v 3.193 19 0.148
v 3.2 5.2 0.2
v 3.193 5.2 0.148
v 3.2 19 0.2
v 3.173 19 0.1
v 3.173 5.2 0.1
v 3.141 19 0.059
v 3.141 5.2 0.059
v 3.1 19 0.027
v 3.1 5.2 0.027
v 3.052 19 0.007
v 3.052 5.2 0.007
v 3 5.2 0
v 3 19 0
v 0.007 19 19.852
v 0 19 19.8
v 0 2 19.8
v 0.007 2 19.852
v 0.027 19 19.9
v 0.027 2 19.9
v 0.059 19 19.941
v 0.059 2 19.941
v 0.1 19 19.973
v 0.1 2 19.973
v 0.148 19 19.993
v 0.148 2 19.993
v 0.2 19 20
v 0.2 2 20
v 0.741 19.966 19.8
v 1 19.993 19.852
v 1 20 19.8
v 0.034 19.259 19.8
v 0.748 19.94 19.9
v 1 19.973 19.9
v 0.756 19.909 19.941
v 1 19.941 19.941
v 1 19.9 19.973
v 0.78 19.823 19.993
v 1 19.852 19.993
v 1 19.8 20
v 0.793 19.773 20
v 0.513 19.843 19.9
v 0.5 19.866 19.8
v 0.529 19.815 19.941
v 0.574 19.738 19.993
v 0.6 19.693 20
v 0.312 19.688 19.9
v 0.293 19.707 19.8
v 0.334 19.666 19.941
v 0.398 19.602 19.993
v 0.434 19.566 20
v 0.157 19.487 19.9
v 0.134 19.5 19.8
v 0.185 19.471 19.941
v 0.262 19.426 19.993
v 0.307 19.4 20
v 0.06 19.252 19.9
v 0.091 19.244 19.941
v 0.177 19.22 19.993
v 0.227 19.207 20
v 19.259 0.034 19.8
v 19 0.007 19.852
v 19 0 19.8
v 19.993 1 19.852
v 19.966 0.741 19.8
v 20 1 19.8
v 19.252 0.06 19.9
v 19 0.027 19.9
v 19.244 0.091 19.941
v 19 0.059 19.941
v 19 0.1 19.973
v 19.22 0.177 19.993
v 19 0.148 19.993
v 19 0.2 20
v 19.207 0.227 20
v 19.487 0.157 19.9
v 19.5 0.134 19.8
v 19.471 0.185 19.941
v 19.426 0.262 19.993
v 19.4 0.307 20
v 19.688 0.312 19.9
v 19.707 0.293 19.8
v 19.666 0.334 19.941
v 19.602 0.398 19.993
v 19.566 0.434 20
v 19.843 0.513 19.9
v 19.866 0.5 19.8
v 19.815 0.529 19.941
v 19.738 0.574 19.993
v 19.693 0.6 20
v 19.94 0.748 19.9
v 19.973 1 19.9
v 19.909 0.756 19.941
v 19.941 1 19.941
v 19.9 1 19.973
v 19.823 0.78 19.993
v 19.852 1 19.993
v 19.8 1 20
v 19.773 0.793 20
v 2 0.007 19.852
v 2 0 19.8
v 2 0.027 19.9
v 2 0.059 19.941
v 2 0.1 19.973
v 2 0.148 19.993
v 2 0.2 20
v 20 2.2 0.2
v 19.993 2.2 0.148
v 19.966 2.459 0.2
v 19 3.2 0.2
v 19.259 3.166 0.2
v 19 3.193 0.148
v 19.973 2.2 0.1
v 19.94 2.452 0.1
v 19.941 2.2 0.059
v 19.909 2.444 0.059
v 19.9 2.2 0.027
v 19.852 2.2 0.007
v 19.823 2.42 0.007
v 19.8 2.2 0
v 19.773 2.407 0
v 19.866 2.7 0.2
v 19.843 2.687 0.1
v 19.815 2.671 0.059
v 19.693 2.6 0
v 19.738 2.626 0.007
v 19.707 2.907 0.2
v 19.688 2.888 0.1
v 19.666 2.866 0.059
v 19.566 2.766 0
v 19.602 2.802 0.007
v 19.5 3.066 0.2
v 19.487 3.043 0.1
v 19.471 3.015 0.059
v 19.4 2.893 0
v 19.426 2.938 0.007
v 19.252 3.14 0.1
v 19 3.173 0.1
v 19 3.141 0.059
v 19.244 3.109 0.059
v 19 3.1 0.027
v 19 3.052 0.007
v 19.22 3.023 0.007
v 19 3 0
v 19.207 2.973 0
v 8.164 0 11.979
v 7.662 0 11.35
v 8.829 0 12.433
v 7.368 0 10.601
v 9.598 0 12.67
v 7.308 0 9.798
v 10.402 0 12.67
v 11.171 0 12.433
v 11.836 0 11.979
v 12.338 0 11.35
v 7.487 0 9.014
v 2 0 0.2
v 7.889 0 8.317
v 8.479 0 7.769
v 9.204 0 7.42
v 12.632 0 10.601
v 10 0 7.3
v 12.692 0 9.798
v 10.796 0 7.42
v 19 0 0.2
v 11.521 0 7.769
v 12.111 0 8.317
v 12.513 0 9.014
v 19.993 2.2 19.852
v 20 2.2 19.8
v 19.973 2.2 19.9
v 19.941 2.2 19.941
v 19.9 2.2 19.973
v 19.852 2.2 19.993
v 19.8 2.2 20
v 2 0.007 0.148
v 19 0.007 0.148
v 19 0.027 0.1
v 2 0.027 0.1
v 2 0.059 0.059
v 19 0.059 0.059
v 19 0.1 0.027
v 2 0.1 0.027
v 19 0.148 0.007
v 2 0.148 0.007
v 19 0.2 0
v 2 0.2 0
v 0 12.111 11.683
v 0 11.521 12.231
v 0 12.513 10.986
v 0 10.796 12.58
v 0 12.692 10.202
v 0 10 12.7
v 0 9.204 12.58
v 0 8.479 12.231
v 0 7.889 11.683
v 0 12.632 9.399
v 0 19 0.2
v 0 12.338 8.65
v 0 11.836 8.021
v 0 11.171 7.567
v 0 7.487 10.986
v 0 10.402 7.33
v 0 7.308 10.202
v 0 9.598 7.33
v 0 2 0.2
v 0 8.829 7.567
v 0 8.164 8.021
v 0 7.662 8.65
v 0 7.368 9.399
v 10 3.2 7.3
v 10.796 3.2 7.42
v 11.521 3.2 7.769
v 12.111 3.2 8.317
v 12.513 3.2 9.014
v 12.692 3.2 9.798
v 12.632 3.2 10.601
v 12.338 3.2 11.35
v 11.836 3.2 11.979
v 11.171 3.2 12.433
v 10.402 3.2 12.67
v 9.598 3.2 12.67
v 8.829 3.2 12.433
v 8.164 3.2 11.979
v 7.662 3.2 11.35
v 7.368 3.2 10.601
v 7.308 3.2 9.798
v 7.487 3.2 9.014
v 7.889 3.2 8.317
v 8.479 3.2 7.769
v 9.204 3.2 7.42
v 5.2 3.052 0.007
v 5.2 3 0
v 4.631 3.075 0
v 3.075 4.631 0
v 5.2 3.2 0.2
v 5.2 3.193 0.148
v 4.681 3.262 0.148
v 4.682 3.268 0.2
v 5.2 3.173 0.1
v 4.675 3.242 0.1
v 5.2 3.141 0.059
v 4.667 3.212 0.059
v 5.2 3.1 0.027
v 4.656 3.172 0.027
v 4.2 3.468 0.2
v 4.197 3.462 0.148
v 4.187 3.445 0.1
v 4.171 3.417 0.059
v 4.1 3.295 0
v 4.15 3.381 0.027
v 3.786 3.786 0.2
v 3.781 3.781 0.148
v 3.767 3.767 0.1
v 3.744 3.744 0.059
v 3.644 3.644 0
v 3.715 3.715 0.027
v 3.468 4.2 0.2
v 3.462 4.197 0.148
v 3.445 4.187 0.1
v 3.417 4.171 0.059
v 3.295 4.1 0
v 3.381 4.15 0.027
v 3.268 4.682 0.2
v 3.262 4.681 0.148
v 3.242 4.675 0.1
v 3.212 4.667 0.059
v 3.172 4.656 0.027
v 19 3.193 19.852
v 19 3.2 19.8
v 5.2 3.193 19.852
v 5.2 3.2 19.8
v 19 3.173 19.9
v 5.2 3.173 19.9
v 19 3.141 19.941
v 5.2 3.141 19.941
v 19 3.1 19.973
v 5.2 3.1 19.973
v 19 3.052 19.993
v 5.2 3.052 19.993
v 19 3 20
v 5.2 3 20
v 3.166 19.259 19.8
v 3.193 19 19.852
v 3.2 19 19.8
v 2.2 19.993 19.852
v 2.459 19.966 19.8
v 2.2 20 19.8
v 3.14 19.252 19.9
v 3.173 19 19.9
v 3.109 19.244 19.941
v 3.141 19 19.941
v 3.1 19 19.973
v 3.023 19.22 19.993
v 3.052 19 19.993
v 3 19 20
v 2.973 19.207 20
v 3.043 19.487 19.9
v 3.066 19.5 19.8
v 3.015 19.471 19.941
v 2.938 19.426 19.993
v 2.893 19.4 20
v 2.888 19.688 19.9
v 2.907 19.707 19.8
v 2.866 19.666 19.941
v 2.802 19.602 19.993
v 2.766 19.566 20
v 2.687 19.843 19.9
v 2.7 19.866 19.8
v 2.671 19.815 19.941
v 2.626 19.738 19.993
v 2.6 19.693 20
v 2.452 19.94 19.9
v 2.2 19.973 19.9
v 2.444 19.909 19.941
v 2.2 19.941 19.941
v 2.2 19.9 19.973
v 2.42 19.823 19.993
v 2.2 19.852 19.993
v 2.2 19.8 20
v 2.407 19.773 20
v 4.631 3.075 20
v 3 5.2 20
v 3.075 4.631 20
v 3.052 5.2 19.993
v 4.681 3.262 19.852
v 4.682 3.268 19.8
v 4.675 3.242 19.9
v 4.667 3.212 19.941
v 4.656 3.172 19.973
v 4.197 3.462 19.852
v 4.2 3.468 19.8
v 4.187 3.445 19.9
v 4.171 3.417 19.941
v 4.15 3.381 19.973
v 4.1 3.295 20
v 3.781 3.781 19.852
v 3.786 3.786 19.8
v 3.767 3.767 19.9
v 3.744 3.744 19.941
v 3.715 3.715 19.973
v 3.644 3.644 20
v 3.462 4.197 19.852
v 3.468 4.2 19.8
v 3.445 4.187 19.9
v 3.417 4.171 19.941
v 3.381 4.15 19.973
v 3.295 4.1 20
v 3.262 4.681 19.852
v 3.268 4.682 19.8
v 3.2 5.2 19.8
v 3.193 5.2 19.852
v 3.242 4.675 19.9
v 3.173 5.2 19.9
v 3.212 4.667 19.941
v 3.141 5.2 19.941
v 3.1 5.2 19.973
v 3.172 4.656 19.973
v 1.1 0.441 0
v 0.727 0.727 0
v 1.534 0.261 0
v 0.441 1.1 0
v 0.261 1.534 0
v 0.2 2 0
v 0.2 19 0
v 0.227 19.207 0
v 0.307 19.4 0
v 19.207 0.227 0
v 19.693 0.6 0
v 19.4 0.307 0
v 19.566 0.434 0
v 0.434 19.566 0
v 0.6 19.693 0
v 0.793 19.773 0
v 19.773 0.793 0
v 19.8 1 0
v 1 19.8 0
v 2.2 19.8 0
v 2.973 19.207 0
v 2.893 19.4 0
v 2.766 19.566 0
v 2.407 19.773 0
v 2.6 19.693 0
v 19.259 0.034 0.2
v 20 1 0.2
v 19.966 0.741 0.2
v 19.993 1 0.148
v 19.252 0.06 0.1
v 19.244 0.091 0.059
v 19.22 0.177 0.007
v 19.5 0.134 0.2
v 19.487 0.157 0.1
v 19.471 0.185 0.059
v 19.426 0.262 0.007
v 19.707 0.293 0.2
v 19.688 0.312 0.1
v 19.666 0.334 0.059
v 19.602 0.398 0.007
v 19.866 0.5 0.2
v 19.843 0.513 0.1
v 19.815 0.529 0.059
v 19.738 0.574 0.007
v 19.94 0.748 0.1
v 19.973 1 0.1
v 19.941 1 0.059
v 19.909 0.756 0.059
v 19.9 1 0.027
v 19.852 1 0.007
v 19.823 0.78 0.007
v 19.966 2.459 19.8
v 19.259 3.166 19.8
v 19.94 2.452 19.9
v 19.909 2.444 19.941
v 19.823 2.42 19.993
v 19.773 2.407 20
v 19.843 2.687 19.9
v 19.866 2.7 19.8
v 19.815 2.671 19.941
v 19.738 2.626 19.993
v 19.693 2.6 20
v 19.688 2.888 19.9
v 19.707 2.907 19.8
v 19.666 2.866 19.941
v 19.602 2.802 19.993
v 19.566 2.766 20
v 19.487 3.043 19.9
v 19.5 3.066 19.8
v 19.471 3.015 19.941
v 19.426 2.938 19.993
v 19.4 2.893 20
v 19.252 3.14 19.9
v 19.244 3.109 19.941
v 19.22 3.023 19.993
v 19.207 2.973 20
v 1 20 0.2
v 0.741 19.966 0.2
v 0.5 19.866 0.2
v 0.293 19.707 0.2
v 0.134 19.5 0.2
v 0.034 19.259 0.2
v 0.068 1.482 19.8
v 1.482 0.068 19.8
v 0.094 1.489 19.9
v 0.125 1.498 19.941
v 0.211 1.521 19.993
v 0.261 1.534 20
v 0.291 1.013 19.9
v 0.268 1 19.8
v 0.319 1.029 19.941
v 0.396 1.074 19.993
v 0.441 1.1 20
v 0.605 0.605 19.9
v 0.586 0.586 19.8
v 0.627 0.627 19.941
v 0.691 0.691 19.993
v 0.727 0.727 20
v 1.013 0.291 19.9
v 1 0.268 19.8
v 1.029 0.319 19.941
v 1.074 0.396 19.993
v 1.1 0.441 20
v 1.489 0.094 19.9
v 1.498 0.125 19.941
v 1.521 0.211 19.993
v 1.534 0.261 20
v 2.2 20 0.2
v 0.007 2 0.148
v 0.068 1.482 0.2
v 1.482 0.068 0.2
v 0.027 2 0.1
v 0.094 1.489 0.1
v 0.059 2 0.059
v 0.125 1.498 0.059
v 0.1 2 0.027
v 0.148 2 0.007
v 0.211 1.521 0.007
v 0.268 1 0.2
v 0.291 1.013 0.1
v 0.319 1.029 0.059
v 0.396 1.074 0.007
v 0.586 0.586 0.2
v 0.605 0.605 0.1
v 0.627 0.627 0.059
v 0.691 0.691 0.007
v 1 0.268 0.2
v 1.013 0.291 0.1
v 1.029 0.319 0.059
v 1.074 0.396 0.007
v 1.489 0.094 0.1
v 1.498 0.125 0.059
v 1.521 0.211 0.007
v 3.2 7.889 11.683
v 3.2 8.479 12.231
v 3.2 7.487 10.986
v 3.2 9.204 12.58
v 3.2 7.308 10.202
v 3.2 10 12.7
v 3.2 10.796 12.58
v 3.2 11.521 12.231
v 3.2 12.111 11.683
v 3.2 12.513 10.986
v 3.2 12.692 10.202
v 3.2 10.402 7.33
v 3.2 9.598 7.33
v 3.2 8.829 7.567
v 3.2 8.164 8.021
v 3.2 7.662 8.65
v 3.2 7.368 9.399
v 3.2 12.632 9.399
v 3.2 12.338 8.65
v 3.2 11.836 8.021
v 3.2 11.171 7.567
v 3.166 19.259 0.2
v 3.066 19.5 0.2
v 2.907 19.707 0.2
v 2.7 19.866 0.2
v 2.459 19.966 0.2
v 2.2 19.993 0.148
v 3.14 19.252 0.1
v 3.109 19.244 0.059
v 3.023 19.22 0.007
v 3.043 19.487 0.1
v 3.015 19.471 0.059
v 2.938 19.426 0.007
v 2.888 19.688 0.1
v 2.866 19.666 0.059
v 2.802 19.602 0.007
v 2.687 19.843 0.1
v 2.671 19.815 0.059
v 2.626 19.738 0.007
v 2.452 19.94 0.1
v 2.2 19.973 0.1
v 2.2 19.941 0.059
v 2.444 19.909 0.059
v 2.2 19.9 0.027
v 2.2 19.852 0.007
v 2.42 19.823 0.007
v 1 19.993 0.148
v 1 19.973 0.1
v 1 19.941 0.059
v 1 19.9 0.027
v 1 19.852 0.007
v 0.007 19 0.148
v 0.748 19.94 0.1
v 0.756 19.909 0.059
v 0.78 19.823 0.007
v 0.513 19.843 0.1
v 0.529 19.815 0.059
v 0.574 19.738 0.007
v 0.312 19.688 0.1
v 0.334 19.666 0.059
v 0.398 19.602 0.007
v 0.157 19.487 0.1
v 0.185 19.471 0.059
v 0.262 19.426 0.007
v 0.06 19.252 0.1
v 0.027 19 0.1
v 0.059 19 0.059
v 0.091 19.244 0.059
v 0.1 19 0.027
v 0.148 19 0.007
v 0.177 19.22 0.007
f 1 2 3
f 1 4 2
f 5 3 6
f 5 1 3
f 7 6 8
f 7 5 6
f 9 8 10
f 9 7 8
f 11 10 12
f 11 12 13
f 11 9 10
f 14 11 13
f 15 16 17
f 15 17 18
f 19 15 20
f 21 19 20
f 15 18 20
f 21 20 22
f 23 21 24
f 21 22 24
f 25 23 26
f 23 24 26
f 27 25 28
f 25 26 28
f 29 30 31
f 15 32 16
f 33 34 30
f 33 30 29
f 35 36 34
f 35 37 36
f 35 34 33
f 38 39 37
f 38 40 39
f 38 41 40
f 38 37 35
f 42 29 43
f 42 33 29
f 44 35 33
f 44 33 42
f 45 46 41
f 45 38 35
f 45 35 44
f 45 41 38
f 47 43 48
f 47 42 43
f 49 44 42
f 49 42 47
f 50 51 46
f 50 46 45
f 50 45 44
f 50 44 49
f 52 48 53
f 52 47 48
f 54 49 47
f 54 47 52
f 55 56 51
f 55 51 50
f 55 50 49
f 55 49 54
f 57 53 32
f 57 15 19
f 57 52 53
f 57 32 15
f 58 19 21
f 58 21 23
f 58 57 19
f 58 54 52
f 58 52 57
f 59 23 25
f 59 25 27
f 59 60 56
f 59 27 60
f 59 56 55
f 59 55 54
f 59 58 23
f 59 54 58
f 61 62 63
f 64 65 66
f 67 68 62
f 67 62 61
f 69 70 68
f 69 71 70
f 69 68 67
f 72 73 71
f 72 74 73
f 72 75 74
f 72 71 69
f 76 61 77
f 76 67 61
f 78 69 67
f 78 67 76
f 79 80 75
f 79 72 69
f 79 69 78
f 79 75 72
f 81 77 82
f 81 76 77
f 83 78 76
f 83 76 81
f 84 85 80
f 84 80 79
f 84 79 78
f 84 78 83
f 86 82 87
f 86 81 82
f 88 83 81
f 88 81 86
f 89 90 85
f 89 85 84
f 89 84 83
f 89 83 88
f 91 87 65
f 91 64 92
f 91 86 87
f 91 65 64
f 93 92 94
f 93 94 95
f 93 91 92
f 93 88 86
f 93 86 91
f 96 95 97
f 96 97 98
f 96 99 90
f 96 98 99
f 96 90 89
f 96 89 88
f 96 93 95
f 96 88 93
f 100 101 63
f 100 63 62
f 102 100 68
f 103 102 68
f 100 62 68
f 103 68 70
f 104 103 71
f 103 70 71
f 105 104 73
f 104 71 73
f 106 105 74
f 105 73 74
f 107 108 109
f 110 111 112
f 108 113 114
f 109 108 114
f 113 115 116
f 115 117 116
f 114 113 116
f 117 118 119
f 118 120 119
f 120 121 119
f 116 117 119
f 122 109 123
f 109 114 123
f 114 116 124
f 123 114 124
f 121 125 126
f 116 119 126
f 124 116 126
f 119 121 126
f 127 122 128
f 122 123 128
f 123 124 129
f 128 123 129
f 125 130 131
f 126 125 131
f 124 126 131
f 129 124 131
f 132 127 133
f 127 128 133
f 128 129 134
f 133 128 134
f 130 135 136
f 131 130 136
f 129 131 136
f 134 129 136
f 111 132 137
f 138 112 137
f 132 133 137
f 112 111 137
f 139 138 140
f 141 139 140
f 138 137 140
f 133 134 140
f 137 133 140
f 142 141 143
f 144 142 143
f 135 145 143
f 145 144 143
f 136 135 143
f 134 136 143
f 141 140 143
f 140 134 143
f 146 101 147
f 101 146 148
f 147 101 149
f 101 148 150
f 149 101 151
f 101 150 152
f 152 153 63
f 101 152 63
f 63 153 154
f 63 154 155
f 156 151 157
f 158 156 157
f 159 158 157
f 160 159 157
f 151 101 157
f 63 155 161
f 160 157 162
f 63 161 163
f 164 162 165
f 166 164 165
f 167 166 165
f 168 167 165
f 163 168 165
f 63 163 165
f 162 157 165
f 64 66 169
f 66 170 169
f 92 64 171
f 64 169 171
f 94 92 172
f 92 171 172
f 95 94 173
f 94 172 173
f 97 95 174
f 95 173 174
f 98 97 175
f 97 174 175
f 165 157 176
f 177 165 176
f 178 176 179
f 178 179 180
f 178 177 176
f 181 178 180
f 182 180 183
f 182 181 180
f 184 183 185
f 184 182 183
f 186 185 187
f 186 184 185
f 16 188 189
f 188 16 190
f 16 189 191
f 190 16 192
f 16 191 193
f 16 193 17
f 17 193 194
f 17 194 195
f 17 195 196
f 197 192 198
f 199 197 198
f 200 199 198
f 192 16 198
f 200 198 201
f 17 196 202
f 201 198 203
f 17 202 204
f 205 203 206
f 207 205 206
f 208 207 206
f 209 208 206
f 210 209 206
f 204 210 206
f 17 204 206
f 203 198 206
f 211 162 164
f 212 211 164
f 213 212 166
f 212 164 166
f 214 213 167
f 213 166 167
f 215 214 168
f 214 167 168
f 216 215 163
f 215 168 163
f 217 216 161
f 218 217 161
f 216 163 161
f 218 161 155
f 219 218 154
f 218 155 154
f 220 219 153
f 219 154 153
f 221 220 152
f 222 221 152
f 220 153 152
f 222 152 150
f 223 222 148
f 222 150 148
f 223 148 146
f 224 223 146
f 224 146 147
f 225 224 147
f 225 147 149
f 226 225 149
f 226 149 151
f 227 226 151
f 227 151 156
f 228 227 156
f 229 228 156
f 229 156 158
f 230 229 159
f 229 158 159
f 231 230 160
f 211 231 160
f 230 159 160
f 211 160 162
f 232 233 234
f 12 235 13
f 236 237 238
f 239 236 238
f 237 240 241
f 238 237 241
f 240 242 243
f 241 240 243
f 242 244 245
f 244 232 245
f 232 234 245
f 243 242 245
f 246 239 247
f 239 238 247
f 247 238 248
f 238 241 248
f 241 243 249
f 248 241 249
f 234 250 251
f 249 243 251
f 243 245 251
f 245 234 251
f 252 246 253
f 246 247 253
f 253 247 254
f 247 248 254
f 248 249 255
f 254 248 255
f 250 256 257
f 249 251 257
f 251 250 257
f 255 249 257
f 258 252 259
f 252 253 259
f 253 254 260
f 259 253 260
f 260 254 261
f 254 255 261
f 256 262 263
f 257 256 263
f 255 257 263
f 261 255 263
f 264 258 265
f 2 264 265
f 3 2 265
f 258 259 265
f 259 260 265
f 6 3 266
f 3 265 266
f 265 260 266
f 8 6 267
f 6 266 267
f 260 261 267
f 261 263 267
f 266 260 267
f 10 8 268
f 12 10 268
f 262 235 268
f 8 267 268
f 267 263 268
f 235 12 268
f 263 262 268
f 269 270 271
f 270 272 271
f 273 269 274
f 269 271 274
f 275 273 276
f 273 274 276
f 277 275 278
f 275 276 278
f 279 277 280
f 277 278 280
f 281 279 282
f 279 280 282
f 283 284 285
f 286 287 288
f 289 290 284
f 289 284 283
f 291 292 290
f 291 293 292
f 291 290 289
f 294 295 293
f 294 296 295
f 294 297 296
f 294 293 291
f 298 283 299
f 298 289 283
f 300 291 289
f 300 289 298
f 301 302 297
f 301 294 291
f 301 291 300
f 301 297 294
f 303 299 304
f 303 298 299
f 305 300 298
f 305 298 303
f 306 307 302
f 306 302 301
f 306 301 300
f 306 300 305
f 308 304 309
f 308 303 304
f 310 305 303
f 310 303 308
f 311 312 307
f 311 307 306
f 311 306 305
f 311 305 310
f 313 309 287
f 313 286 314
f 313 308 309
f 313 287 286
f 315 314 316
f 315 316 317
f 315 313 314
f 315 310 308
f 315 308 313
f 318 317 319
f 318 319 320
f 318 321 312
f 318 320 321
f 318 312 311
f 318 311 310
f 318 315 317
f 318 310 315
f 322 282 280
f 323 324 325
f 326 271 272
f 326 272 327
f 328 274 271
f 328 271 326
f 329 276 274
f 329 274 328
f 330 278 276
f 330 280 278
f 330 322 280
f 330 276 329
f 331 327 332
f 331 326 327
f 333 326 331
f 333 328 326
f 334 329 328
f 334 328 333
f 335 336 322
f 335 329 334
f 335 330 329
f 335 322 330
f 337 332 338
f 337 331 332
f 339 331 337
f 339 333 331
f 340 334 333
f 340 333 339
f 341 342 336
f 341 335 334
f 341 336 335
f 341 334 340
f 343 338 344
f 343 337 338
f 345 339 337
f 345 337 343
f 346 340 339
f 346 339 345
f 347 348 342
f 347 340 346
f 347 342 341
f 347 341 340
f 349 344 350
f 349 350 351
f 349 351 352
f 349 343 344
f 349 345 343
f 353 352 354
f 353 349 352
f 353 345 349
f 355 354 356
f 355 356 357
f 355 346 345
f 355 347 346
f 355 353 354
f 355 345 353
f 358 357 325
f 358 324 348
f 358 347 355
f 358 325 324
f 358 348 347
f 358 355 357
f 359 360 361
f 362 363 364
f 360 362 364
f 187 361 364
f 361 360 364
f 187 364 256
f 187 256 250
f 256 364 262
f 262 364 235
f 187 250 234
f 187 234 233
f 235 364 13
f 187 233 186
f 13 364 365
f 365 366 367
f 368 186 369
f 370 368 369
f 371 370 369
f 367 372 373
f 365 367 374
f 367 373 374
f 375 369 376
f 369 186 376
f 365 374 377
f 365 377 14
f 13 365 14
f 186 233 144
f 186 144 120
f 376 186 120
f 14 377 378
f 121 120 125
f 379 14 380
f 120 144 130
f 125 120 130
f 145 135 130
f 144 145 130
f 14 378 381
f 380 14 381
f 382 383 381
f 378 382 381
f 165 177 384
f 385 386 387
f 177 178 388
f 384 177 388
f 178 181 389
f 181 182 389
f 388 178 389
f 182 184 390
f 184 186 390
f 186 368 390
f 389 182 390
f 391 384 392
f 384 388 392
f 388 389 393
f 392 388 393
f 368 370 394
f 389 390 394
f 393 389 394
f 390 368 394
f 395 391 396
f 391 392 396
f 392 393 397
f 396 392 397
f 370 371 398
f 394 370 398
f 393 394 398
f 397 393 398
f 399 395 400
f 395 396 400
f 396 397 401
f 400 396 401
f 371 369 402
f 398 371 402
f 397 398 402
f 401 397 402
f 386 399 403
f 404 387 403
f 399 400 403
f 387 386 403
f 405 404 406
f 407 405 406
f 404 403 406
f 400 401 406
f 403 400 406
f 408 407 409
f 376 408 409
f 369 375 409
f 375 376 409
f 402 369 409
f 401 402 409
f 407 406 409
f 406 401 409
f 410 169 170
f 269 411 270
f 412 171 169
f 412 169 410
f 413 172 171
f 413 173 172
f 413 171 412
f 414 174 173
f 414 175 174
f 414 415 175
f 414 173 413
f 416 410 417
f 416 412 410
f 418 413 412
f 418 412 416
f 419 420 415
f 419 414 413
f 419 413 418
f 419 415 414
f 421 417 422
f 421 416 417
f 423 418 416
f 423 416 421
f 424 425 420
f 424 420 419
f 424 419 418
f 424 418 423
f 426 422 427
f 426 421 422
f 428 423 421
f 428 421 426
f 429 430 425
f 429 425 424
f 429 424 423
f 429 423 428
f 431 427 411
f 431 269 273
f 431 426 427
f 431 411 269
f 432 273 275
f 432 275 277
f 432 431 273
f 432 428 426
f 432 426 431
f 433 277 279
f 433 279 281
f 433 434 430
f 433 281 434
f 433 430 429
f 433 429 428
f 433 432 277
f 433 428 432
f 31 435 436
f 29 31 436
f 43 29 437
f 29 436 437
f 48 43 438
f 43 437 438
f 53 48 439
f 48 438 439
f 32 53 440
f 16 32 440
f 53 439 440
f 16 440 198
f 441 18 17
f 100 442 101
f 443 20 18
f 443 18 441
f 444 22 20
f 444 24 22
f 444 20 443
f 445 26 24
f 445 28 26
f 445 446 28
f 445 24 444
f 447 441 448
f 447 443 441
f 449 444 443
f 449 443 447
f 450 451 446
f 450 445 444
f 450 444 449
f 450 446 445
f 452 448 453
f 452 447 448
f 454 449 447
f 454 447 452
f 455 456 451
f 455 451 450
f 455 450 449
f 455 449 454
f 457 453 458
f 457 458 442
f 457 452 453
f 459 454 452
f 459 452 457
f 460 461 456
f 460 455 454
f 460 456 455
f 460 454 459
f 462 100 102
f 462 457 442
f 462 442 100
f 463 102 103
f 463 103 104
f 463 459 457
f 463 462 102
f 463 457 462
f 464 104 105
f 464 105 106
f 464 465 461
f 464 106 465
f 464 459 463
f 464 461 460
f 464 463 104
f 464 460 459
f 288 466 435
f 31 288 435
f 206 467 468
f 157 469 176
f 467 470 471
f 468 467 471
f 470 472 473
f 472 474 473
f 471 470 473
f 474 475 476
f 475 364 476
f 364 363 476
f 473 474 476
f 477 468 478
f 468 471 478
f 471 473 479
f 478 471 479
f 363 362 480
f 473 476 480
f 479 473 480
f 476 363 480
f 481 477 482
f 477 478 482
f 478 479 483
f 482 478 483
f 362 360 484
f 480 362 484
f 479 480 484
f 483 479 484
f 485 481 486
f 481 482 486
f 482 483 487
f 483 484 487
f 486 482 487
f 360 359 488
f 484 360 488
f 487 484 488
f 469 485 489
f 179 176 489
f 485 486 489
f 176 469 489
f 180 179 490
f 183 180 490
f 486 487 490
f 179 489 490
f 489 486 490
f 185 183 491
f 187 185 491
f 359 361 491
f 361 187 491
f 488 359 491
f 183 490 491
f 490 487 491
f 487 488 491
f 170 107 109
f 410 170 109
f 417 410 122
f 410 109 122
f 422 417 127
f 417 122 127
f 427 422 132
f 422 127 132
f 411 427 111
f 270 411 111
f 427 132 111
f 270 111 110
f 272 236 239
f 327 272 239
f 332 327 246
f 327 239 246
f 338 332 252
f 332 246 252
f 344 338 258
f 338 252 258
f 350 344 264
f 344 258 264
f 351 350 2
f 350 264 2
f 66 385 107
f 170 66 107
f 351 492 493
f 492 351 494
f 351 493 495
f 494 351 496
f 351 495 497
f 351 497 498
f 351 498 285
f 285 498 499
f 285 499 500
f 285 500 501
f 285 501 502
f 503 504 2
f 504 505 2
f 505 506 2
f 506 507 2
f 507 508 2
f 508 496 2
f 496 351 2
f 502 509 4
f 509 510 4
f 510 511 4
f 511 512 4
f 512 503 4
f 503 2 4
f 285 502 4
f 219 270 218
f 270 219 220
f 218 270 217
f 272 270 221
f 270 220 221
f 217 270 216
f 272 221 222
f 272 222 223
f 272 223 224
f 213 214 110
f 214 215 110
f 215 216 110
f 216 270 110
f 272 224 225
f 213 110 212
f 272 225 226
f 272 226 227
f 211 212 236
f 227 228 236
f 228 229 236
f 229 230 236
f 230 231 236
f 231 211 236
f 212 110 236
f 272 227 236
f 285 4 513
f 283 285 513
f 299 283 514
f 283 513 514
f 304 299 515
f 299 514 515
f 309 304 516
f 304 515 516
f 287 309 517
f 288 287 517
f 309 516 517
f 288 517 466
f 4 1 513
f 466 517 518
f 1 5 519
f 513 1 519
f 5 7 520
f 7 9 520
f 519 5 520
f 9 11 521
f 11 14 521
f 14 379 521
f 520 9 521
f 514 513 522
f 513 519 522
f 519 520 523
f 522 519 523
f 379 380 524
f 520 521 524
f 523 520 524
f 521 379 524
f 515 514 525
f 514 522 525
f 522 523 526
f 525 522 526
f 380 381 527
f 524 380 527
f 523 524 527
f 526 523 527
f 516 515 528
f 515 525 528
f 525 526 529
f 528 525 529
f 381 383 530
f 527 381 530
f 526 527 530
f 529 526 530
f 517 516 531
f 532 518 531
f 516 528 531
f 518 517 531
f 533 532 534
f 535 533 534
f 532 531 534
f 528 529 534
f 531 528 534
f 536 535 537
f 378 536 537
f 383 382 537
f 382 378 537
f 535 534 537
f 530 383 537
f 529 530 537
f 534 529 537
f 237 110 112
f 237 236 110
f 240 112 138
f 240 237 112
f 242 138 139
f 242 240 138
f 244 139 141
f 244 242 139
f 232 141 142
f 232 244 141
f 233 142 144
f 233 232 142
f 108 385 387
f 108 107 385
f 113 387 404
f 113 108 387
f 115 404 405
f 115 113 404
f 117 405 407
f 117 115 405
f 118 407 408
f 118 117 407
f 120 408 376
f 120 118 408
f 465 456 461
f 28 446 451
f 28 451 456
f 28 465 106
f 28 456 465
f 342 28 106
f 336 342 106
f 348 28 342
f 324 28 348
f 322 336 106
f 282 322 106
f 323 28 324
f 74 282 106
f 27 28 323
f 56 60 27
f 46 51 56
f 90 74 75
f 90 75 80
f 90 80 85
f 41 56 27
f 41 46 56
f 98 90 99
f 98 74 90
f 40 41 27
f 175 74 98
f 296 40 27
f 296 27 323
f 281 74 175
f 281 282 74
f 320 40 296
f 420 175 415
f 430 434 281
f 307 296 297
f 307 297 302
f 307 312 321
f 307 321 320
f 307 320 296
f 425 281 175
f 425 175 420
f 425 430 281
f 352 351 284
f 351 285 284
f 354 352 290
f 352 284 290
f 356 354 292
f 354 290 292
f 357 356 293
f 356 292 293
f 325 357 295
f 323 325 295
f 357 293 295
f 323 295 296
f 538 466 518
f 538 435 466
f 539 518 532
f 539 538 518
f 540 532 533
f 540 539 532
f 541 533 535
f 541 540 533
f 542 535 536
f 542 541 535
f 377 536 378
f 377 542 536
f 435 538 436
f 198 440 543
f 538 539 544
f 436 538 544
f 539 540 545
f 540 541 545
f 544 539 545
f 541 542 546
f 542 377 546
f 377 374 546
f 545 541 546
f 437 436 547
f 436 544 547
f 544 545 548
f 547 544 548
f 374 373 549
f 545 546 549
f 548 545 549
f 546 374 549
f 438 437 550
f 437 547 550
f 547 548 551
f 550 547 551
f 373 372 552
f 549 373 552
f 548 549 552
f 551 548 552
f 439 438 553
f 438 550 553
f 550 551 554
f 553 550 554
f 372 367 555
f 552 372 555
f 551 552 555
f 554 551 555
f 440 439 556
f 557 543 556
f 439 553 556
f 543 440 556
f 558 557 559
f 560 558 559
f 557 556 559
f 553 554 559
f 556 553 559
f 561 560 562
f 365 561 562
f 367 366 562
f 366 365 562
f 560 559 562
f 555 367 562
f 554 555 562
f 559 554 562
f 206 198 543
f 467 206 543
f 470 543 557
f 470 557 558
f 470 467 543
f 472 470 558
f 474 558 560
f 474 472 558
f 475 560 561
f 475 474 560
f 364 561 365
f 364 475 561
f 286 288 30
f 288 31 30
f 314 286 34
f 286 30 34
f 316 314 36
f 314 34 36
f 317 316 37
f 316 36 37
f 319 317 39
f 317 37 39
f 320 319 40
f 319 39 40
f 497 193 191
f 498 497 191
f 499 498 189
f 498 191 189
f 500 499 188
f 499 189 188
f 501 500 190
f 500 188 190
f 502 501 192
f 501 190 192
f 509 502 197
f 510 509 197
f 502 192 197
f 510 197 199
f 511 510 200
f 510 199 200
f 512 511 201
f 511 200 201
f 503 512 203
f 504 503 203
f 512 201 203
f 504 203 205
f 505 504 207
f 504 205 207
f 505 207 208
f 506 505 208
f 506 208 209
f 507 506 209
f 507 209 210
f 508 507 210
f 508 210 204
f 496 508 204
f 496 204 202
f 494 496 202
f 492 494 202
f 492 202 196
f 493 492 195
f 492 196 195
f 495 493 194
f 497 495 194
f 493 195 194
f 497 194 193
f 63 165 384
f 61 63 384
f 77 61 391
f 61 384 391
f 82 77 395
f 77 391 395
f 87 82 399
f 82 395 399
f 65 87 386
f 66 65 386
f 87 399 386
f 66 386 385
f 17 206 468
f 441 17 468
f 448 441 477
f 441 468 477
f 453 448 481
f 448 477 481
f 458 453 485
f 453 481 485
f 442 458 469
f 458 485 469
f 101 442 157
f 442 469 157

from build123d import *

# Parameters (mm, degrees)
BOSS_EXTRUDE1_DEPTH = 20
FILLET1_R           = 0.2
SKETCH2_R           = 2.7
CUT_EXTRUDE1_DEPTH  = 3.2
SKETCH3_R           = 2.7
CUT_EXTRUDE2_DEPTH  = 3.2


with BuildPart() as part:
    # Sketch1 → Boss-Extrude1 (new body)
    with BuildSketch(Plane.XY):
        with BuildLine():
            Line((5.679190751, 0), (19, 0))
            ThreePointArc((19, 0), (19.707106781, 0.292893219), (20, 1))
            Line((20, 1), (20, 2.2))
            ThreePointArc((20, 2.2), (19.707106781, 2.907106781), (19, 3.2))
            Line((19, 3.2), (5.2, 3.2))
            ThreePointArc((5.2, 3.2), (3.785786438, 3.785786438), (3.2, 5.2))
            Line((3.2, 5.2), (3.2, 19))
            ThreePointArc((3.2, 19), (2.907106781, 19.707106781), (2.2, 20))
            Line((2.2, 20), (1, 20))
            ThreePointArc((1, 20), (0.292893219, 19.707106781), (0, 19))
            Line((0, 19), (0, 2))
            ThreePointArc((0, 2), (0.585786438, 0.585786438), (2, 0))
            Line((2, 0), (5.679190751, 0))
        make_face()
    extrude(amount=BOSS_EXTRUDE1_DEPTH)

    # Fillet1
    fillet1_edges = [part.edges().sort_by_distance(p)[0] for p in [
        (2.907106781, 19.707106781, 20),
        (12.1, 3.2, 0),
        (19.707106781, 2.907106781, 0),
        (20, 1.6, 0),
        (19.707106781, 0.292893219, 0),
        (10.5, 0, 0),
        (0.585786438, 0.585786438, 0),
        (0, 10.5, 0),
        (0.292893219, 19.707106781, 0),
        (1.6, 20, 0),
        (1.6, 20, 20),
        (2.907106781, 19.707106781, 0),
        (3.2, 12.1, 0),
        (3.785786438, 3.785786438, 0),
        (0.292893219, 19.707106781, 20),
        (0, 10.5, 20),
        (0.585786438, 0.585786438, 20),
        (10.5, 0, 20),
        (19.707106781, 0.292893219, 20),
        (20, 1.6, 20),
        (19.707106781, 2.907106781, 20),
        (3.785786438, 3.785786438, 20),
        (12.1, 3.2, 20),
        (3.2, 12.1, 20),
    ]]
    fillet(fillet1_edges, radius=FILLET1_R)

    # Sketch2 → Cut-Extrude1 (cut)
    with BuildSketch(Plane.ZY):
        with Locations((10, 10)):
            Circle(SKETCH2_R)
    extrude(amount=-CUT_EXTRUDE1_DEPTH, mode=Mode.SUBTRACT)

    # Sketch3 → Cut-Extrude2 (cut)
    with BuildSketch(Plane.XZ):
        with Locations(Location((10, 10, 0), (0, 0, 270))):
            Circle(SKETCH3_R)
    extrude(amount=-CUT_EXTRUDE2_DEPTH, mode=Mode.SUBTRACT)


solid = part.part
